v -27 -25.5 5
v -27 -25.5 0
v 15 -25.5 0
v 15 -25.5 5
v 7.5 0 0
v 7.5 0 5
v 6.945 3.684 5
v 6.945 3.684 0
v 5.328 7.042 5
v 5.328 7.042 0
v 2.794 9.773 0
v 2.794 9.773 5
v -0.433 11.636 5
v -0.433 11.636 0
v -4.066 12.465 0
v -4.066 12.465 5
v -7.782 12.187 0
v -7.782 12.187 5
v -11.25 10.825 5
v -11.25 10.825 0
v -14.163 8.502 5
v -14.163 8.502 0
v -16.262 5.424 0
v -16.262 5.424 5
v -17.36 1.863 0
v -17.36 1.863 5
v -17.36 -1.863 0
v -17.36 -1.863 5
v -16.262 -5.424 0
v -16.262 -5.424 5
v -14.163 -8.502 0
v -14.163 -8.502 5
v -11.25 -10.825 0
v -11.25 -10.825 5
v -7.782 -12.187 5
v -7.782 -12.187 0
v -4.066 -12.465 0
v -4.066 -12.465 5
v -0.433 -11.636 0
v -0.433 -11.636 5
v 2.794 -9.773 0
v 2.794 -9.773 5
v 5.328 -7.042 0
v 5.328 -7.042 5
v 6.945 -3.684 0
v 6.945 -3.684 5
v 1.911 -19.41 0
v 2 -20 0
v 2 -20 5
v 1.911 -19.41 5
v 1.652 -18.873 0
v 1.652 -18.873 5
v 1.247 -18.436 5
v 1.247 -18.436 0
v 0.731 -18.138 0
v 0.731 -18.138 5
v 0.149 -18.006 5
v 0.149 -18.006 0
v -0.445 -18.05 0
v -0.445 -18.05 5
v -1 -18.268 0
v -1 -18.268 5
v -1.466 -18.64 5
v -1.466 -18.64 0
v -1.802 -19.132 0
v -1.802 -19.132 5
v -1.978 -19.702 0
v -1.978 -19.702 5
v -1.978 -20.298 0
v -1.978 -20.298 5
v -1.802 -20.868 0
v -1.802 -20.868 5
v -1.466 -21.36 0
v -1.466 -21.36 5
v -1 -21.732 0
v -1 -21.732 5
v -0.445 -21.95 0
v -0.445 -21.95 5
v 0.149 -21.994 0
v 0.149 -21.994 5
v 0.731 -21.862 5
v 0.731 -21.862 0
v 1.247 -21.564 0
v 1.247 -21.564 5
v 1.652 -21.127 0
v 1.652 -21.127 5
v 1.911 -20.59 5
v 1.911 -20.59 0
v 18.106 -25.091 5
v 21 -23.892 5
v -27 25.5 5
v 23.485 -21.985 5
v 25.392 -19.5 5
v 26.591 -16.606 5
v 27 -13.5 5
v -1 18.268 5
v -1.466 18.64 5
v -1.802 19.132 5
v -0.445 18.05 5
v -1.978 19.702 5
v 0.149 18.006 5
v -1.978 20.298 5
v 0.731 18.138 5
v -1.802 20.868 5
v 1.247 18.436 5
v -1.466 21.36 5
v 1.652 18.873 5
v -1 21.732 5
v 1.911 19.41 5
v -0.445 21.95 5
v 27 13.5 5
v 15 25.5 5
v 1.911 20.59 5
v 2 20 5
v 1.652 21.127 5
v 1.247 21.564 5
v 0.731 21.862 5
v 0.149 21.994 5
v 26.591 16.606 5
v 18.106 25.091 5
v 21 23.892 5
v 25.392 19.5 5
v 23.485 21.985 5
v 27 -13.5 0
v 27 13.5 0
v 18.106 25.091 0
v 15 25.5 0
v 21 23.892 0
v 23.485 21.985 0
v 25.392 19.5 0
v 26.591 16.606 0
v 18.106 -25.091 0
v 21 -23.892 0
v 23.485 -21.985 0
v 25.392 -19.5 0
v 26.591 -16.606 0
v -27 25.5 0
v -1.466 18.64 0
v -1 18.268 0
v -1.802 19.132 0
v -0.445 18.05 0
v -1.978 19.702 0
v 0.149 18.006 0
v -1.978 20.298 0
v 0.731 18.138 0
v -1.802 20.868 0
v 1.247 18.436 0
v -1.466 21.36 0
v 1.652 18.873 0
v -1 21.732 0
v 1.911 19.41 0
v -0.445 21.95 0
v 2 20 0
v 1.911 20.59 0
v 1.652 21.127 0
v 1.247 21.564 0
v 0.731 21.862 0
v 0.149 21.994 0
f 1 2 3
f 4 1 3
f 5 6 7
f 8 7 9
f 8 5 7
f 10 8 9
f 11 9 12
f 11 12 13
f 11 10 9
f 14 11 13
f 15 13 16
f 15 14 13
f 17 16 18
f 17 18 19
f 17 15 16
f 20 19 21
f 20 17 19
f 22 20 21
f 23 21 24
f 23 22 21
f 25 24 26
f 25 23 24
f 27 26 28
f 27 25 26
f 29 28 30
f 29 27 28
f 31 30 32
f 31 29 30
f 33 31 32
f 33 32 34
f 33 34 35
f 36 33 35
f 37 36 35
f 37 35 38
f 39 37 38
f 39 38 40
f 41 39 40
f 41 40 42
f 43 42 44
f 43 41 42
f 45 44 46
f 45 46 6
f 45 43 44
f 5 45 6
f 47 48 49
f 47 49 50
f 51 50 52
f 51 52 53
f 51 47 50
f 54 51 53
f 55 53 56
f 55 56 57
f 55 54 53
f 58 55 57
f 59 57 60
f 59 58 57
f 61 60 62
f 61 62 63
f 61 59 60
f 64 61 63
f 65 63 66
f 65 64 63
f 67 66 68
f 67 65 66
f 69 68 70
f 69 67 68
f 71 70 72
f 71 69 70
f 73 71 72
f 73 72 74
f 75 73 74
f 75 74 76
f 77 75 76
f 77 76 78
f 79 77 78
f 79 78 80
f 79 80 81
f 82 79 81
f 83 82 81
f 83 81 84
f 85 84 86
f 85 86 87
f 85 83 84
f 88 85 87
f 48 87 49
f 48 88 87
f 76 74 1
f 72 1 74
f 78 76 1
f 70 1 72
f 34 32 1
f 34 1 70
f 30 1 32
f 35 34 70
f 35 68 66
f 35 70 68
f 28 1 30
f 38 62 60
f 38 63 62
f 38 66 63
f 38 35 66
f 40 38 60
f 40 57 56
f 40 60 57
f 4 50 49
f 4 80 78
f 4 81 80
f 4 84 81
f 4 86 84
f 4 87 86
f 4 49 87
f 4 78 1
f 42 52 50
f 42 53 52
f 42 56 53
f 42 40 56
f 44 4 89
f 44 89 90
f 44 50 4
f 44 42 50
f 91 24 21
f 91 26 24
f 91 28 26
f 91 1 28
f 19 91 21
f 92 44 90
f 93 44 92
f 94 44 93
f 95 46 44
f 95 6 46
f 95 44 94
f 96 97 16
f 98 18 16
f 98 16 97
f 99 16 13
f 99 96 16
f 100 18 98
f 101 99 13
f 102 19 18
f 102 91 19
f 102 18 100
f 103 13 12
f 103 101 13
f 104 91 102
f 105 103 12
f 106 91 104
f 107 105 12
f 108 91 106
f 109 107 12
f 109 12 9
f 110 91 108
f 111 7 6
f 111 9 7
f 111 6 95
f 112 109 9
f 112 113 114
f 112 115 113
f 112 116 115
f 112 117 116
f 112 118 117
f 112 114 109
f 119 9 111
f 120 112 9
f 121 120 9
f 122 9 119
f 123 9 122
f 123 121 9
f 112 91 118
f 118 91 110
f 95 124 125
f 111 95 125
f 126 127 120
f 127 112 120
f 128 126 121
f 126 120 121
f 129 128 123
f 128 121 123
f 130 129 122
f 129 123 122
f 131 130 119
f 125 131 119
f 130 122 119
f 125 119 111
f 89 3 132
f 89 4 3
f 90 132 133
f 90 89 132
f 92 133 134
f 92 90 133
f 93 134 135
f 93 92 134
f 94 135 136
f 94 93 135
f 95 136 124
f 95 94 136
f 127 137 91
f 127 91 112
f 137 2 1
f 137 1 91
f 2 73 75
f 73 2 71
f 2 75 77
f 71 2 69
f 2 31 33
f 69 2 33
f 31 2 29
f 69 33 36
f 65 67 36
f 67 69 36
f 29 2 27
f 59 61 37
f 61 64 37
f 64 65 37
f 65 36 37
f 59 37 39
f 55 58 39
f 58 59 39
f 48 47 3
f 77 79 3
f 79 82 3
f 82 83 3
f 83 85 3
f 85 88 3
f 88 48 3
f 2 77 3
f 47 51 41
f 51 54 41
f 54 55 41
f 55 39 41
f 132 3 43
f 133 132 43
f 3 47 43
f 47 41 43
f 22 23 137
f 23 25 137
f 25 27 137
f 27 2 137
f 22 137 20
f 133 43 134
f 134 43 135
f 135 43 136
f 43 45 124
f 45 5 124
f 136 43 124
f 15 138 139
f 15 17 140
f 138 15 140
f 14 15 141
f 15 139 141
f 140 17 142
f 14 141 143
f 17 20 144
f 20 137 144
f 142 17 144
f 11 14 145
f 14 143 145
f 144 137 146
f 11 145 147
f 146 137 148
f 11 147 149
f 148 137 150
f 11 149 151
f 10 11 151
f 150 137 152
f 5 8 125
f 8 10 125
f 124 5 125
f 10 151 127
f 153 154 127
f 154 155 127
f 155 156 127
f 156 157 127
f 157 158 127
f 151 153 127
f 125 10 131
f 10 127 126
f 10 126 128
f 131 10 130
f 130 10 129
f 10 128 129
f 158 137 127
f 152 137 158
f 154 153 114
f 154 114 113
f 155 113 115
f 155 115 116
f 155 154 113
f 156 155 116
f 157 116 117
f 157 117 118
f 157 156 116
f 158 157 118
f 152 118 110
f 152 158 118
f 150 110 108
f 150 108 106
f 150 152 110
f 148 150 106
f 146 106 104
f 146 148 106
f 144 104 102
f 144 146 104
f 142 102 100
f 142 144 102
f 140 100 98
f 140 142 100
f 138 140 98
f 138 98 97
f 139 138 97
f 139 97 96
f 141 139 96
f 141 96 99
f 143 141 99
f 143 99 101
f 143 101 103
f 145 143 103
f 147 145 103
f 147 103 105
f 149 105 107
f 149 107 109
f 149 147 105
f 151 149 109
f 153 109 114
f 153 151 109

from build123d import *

# Parameters (mm, degrees)
F0_W     = 54
F0_H     = 51
F0_R     = 2
F0_R_2   = 12.5
F1_DEPTH = 5
F2_R     = 12


with BuildPart() as f1:
    # F0 (on Top) → F1 (new body)
    with BuildSketch(Plane.XY):
        Rectangle(F0_W, F0_H)
        with Locations((0, -20)):
            Circle(F0_R, mode=Mode.SUBTRACT)
        with Locations((-5, 0)):
            Circle(F0_R_2, mode=Mode.SUBTRACT)
        with Locations((0, 20)):
            Circle(F0_R, mode=Mode.SUBTRACT)
    extrude(amount=F1_DEPTH)

    # F2
    f2_edges = [f1.edges().sort_by_distance(p)[0] for p in [
        (27, -25.5, 2.5),
        (27, 25.5, 2.5),
    ]]
    fillet(f2_edges, radius=F2_R)


solid = f1.part
